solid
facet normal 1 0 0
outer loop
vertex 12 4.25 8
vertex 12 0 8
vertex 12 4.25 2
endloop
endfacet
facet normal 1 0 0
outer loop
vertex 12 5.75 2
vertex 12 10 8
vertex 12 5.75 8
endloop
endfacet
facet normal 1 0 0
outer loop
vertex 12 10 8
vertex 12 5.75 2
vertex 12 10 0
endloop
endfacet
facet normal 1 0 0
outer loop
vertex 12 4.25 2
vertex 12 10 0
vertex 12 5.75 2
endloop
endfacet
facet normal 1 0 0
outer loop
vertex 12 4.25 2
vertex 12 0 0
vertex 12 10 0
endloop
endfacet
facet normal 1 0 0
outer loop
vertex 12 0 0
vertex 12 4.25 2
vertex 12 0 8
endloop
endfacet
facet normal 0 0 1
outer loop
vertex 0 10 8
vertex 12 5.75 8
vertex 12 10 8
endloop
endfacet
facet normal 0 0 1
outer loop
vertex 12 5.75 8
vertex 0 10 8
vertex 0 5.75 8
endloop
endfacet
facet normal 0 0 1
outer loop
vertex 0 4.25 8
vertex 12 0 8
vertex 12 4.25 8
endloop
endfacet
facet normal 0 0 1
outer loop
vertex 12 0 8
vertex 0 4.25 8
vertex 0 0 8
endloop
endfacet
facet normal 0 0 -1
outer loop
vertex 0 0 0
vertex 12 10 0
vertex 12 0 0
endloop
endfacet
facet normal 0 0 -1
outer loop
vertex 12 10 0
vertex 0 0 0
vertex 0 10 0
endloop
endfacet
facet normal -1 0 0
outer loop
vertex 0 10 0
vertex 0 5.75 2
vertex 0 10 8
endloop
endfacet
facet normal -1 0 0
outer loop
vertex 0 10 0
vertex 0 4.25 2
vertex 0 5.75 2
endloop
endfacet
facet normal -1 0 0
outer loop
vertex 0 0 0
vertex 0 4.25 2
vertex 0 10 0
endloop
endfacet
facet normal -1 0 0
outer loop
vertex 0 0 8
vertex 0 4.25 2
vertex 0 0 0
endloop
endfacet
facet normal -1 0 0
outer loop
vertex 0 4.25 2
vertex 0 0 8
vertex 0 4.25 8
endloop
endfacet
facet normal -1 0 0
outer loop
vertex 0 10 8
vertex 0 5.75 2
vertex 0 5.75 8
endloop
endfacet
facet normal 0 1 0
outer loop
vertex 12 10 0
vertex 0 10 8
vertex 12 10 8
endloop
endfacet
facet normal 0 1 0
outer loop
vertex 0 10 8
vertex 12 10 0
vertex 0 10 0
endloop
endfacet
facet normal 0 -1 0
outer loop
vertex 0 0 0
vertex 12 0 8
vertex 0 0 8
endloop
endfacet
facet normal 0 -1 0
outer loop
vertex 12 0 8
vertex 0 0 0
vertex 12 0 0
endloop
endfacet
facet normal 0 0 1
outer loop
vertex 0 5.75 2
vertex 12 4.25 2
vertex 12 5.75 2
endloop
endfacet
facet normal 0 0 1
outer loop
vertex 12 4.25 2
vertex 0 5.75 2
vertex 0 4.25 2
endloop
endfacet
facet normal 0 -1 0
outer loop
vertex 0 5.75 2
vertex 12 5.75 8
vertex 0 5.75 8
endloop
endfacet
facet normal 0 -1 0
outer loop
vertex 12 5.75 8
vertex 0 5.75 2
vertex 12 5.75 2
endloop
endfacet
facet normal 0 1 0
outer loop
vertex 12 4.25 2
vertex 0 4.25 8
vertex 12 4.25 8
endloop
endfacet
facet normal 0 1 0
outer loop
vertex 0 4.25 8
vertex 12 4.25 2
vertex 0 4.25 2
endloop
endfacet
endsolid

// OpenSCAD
$fn = 32;

// ----------------------------------------------------------------------
// Micro clip: slotted block, 5-20 mm class
// ----------------------------------------------------------------------

// --- parameters (mm) ---
block_l = 12;             // block length, X
block_w = 10;             // block width, Y
block_h = 8;              // block height, Z
slot_w = 1.5;             // slot width
slot_d = 6;               // slot depth from the top

difference() {
  cube([block_l, block_w, block_h]);
  translate([-1, block_w / 2 - slot_w / 2, block_h - slot_d])
    cube([block_l + 2, slot_w, slot_d + 1]);
}
